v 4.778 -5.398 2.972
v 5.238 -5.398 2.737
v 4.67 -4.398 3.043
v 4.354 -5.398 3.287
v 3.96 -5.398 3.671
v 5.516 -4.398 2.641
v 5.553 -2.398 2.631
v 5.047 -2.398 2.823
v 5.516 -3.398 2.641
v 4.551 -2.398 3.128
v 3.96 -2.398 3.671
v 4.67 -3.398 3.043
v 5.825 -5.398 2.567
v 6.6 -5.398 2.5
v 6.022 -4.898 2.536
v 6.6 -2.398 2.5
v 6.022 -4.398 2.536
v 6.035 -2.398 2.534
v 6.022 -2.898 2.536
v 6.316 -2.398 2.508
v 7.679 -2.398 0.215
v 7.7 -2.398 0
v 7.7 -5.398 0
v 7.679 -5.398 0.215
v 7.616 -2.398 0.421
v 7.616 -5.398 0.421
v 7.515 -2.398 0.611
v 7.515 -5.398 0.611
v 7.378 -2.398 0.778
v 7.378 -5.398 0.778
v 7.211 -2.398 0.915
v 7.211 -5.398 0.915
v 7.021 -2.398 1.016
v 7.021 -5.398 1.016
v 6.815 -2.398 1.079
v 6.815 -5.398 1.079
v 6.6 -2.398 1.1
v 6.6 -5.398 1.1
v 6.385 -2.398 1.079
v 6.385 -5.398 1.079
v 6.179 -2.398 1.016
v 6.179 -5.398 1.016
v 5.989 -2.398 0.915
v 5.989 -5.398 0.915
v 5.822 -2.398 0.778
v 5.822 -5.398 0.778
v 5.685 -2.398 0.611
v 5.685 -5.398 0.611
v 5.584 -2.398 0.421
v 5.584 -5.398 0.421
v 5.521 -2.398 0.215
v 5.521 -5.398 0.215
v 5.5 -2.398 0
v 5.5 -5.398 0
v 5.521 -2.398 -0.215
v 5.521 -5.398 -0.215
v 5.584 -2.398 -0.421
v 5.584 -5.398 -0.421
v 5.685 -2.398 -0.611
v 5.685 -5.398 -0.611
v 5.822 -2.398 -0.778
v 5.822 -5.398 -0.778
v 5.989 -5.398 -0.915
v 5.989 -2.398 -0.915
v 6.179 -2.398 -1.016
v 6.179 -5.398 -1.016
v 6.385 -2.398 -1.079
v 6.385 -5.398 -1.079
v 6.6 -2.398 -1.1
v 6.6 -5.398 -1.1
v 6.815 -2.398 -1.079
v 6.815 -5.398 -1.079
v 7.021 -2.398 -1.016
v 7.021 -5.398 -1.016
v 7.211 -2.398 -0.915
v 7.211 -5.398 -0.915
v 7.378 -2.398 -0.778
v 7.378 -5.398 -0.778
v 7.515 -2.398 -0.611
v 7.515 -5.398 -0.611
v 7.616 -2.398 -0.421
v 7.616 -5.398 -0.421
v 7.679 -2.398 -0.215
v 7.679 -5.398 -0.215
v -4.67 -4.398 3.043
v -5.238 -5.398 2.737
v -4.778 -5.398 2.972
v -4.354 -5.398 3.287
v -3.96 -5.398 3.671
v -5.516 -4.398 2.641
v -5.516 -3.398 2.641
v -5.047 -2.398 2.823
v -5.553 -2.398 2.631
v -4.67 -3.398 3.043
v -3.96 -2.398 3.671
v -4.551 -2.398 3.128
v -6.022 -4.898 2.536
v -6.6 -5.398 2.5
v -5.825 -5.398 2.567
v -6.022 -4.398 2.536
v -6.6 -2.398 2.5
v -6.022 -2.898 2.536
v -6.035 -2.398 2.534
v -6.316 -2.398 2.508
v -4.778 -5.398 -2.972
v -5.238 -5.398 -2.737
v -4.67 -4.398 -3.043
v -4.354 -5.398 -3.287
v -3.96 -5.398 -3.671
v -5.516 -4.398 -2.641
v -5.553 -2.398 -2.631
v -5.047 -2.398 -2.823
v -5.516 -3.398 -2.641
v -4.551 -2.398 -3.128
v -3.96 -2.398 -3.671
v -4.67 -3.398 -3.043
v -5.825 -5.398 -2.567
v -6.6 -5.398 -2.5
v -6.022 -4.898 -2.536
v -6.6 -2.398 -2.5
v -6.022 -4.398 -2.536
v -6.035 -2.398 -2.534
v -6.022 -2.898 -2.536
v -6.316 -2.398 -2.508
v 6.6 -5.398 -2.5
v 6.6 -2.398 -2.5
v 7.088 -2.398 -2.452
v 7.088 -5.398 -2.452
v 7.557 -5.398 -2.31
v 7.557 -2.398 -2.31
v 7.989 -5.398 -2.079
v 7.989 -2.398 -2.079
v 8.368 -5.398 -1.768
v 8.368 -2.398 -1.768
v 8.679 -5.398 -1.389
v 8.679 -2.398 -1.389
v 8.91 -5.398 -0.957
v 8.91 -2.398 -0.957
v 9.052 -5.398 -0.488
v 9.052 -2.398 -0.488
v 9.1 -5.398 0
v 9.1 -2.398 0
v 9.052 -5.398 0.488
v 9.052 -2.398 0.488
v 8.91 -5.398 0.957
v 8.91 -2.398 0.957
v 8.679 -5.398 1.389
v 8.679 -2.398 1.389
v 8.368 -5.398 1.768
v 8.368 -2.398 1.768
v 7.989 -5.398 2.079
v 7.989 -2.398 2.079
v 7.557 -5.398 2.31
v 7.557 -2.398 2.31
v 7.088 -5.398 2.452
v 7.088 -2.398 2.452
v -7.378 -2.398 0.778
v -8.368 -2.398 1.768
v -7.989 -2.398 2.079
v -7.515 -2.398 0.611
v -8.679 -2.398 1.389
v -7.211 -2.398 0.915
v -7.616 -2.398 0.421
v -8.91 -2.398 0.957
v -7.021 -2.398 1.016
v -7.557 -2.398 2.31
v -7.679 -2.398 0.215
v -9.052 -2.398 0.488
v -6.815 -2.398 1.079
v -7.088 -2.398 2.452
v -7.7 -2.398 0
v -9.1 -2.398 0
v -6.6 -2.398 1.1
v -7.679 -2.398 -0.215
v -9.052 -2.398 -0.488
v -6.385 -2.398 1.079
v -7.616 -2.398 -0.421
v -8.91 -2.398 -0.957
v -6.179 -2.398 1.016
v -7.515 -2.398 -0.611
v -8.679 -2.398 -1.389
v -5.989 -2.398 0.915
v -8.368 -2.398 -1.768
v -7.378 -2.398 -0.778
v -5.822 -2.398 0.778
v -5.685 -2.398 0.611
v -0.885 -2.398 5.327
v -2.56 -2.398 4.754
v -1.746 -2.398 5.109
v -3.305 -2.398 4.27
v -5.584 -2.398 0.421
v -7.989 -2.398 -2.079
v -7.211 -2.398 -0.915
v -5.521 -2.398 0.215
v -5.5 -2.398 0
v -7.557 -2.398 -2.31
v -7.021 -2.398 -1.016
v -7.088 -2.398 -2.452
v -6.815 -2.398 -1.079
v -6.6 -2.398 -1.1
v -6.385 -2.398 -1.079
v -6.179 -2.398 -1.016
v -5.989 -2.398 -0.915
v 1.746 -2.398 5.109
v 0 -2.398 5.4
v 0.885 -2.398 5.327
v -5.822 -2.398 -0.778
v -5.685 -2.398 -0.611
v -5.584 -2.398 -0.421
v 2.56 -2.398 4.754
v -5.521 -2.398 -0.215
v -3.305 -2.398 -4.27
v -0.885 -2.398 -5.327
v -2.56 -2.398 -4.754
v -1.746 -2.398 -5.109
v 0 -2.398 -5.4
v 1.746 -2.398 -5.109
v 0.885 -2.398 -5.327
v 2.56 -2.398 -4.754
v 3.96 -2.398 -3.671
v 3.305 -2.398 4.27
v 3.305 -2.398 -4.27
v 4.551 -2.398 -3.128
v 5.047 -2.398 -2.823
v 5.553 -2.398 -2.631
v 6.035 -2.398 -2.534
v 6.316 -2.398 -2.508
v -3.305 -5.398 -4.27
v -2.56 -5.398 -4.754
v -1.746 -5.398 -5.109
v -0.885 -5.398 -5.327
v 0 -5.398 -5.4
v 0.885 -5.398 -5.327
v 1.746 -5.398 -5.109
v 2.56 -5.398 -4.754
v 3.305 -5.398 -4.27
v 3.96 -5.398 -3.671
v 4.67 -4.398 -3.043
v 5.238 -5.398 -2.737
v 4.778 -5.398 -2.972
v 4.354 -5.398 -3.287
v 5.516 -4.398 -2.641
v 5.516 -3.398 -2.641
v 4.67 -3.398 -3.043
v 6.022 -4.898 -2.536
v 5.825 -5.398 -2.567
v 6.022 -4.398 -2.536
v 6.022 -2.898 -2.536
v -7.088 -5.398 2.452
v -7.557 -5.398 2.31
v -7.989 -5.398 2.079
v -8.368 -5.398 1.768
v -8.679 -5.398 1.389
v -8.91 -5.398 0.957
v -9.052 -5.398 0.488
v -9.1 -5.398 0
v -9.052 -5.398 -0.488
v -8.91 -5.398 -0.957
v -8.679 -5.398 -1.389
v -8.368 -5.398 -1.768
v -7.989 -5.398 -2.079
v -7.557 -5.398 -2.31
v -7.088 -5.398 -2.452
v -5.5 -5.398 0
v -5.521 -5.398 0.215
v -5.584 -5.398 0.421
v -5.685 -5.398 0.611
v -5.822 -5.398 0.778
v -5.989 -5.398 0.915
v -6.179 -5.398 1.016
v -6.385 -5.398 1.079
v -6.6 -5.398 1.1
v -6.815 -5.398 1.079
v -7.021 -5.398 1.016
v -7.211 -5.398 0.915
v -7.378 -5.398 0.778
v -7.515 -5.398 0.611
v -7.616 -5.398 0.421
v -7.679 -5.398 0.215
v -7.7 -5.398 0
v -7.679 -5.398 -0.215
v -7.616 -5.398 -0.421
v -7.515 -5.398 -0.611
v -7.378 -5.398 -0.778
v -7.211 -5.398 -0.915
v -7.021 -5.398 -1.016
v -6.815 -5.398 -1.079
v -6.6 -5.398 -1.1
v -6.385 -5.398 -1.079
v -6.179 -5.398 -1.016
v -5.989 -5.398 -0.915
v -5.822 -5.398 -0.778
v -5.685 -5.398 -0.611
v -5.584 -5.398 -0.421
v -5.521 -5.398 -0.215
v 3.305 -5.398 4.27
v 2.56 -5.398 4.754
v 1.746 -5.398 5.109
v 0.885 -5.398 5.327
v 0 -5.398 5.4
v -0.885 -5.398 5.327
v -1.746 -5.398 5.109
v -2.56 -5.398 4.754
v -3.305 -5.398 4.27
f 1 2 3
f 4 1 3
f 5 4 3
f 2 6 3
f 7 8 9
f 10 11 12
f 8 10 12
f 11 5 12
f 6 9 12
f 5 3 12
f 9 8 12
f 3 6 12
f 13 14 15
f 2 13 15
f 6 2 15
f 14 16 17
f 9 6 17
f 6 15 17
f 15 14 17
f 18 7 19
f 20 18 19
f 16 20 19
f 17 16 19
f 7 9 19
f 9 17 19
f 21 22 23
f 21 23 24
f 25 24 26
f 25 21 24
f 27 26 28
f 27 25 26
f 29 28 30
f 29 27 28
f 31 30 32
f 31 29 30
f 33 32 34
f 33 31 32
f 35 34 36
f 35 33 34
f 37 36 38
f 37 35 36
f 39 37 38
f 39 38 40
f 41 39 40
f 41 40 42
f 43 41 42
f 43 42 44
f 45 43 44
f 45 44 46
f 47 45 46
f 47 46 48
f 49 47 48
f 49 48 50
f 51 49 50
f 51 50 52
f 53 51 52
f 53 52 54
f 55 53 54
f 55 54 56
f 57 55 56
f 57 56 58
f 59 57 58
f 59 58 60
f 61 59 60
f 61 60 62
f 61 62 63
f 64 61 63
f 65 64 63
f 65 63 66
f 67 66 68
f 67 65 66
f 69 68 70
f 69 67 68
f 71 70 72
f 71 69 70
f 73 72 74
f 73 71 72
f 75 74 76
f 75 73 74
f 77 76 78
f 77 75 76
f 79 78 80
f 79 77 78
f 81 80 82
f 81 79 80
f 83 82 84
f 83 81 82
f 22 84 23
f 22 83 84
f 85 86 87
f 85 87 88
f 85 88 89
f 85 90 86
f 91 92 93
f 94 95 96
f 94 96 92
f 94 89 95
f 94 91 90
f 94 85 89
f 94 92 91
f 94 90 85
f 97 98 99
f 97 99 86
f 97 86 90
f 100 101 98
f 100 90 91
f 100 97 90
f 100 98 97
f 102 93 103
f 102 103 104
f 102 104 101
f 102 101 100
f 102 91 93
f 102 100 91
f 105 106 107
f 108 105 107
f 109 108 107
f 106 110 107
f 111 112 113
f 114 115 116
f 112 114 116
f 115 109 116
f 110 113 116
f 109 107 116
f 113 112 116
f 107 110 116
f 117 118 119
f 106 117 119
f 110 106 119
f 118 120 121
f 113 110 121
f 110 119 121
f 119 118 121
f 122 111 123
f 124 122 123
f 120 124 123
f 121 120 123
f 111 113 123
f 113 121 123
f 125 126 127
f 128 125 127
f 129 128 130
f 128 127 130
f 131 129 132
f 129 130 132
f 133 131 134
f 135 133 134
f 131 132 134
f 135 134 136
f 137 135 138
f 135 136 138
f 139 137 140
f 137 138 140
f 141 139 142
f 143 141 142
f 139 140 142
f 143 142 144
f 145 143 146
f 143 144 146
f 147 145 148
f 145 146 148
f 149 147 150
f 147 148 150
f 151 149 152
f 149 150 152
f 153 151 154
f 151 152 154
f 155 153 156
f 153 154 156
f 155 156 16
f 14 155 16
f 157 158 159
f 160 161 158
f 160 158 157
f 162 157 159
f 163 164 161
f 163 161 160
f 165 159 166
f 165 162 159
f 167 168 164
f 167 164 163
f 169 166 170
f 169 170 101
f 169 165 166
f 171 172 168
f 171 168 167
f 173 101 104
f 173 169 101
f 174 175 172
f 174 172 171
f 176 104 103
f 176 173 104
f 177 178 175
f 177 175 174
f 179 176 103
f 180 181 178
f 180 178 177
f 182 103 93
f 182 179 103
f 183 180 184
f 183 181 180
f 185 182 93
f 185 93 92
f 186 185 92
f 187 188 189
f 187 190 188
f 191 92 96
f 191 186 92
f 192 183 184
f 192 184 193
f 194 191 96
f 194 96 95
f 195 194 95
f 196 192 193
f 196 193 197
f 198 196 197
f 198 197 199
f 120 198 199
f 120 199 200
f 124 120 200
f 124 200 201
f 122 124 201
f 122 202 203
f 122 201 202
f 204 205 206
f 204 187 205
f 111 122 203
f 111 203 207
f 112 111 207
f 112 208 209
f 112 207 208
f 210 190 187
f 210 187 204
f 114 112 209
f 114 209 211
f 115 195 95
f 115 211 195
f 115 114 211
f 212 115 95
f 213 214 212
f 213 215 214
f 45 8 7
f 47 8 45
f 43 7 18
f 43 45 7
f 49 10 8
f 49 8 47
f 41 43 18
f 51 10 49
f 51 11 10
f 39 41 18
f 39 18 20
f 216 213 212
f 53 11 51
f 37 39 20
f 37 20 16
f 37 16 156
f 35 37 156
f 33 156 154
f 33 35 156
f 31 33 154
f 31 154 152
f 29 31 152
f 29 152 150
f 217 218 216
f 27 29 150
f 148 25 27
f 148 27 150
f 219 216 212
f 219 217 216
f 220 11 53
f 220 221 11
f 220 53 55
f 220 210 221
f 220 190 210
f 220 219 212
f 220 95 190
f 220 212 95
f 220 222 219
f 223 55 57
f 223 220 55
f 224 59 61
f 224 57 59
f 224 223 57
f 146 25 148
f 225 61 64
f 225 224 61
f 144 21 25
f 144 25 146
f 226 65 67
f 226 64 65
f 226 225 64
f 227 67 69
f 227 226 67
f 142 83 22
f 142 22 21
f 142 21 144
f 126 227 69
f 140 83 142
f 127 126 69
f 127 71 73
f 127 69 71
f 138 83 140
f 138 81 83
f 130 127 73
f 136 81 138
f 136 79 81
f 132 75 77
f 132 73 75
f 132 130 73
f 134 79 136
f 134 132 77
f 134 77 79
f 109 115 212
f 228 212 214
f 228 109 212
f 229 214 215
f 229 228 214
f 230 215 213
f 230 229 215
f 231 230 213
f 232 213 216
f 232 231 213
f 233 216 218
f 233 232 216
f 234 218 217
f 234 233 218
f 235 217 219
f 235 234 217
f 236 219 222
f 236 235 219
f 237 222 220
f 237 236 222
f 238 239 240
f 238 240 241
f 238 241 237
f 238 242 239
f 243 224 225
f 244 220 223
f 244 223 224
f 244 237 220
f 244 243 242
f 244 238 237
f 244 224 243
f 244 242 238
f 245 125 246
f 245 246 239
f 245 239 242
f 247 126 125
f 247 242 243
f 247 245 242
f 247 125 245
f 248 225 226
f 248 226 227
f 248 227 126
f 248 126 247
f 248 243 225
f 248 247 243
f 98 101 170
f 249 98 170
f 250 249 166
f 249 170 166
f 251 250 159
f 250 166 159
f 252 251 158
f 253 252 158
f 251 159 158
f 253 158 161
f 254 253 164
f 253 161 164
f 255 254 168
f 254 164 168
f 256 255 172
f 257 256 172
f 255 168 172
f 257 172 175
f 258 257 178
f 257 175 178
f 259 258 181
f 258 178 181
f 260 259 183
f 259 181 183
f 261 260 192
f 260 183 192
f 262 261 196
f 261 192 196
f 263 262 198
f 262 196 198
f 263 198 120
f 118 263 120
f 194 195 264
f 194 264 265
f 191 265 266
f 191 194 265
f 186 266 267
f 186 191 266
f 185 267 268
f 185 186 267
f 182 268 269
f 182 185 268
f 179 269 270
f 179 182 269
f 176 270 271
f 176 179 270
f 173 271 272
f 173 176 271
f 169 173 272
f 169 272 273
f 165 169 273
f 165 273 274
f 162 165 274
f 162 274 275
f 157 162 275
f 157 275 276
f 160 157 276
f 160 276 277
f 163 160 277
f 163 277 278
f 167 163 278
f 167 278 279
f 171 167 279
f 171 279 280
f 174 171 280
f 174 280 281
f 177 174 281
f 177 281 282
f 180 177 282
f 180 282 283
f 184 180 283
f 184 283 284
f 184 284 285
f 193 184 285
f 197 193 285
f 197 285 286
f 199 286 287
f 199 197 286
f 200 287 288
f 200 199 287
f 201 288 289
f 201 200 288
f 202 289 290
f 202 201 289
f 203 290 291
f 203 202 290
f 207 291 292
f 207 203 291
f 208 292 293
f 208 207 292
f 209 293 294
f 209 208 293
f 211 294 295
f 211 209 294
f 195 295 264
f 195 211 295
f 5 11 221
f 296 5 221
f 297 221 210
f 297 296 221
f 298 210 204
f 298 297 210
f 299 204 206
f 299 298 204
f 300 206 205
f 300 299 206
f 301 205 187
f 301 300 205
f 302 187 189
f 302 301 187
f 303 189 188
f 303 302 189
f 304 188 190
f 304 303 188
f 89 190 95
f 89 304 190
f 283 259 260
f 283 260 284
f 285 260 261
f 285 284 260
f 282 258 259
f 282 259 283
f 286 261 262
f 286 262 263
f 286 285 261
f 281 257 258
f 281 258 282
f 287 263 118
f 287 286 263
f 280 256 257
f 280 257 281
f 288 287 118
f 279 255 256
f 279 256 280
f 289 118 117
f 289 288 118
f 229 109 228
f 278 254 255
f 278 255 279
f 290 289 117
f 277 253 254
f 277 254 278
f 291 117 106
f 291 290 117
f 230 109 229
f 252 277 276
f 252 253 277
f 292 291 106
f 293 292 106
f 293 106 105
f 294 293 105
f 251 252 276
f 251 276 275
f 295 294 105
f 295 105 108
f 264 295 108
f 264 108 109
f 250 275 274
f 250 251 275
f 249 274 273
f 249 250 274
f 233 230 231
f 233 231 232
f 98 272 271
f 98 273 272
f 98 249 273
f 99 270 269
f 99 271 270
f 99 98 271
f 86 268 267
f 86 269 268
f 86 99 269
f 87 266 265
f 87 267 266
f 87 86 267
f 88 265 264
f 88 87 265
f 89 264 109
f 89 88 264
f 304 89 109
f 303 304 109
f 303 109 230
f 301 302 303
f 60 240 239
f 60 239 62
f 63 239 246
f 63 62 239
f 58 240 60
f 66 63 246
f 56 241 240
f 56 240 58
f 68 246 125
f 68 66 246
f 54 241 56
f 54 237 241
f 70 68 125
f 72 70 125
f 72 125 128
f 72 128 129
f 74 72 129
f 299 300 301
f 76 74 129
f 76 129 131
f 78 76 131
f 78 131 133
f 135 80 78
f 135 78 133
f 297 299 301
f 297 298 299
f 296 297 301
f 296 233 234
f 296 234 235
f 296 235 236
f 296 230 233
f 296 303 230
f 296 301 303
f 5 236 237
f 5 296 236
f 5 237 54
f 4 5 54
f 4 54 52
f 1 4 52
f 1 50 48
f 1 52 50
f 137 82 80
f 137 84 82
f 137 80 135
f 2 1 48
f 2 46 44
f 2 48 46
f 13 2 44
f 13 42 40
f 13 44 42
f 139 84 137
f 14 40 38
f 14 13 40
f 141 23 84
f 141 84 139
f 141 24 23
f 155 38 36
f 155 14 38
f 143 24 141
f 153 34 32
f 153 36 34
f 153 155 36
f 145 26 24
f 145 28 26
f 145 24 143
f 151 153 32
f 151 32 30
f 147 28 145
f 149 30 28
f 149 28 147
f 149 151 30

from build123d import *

# Parameters (mm, degrees)
BOSS_EXTRUDE1_START     = -8
BOSS_EXTRUDE1_OUTLINE_R = 1.1
BOSS_EXTRUDE1_DEPTH     = 8
SKETCH4_R               = 5.399616231
BOSS_EXTRUDE2_DEPTH     = 8
CUT_EXTRUDE1_DEPTH      = 12.881979778
CUT_EXTRUDE1_DEPTH_BACK = 12.881979778
SKETCH5_W               = 18.2
SKETCH5_H               = 5


# Read off the part's stored shape, not the designer's step: Boss-Extrude1
with BuildPart() as part:
    # Sketch1 → Revolve3 (revolve)
    with BuildSketch(Plane.XY):
        with BuildLine():
            Line((-5.399616231, -5.3975), (0, -5.3975))
            Line((0, -5.3975), (0, 2.6025))
            Line((0, 2.6025), (-3.988533565, 2.6025))
            ThreePointArc((-3.988533565, 2.6025), (-4.472061932, 1.637702149), (-4.725960888, 0.58881231))
            add(Edge.make_bspline(
                [(-4.725960888, 0.58881231), (-5.528679385, 0.558813228), (-5.399616231, 0.190451496), (-5.399616231, -0.666596714)],
                knots=[0, 0, 0, 0, 1, 1, 1, 1], degree=3))
            Line((-5.399616231, -0.666596714), (-5.399616231, -5.3975))
        make_face()
    revolve(axis=Axis((0, 8.574910523, 0), (0, -1, 0)))



with BuildPart() as body_2:
    # Boss-Extrude1 outline → Boss-Extrude1 (new body)
    # profile 1 of 2: a face of its own
    with BuildSketch(Plane.XZ.offset(5.3975).offset(BOSS_EXTRUDE1_START)):
        with BuildLine():
            add(Edge.make_bspline(
                [(6.6, -2.5), (5.362311666, -2.5), (4.636385799, -2.941104214), (3.959842535, -3.670899419)],
                knots=[0, 0, 0, 0, 1, 1, 1, 1], degree=3))
            ThreePointArc((6.6, -2.5), (9.1, 0), (6.6, 2.5))
            add(Edge.make_bspline(
                [(6.6, 2.5), (5.362311666, 2.5), (4.636385799, 2.941104214), (3.959842535, 3.670899419)],
                knots=[0, 0, 0, 0, 1, 1, 1, 1], degree=3))
            ThreePointArc((3.959842535, 3.670899419), (5.399616231, 0), (3.959842535, -3.670899419))
        make_face()
        with Locations((6.6, 0)):
            Circle(BOSS_EXTRUDE1_OUTLINE_R, mode=Mode.SUBTRACT)
    # profile 2 of 2: a face of its own
    with BuildSketch(Plane.XZ.offset(5.3975).offset(BOSS_EXTRUDE1_START)):
        with BuildLine():
            ThreePointArc((-6.6, 2.5), (-9.1, 0), (-6.6, -2.5))
            add(Edge.make_bspline(
                [(-6.6, -2.5), (-5.362311666, -2.5), (-4.636385799, -2.941104214), (-3.959842535, -3.670899419)],
                knots=[0, 0, 0, 0, 1, 1, 1, 1], degree=3))
            ThreePointArc((-3.959842535, -3.670899419), (-5.399616231, 0), (-3.959842535, 3.670899419))
            add(Edge.make_bspline(
                [(-6.6, 2.5), (-5.362311666, 2.5), (-4.636385799, 2.941104214), (-3.959842535, 3.670899419)],
                knots=[0, 0, 0, 0, 1, 1, 1, 1], degree=3))
        make_face()
        with Locations((-6.6, 0)):
            Circle(BOSS_EXTRUDE1_OUTLINE_R, mode=Mode.SUBTRACT)
    extrude(amount=BOSS_EXTRUDE1_DEPTH)


with BuildPart() as part_1:
    add(part.part)

    add(body_2.part)  # Boss-Extrude2 merges body 2
    # Sketch4 → Boss-Extrude2 (add)
    with BuildSketch(Plane.XZ.offset(5.3975)):
        Circle(SKETCH4_R)
    extrude(amount=-BOSS_EXTRUDE2_DEPTH)

    # Sketch5 → Cut-Extrude1 (cut, two sides: drawn at the far end of the back side and taken through both)
    with BuildSketch(Plane.XY.offset(-CUT_EXTRUDE1_DEPTH_BACK)):
        with Locations((0, 0.1025)):
            Rectangle(SKETCH5_W, SKETCH5_H)
    extrude(amount=CUT_EXTRUDE1_DEPTH + CUT_EXTRUDE1_DEPTH_BACK, mode=Mode.SUBTRACT)


solid = part_1.part
